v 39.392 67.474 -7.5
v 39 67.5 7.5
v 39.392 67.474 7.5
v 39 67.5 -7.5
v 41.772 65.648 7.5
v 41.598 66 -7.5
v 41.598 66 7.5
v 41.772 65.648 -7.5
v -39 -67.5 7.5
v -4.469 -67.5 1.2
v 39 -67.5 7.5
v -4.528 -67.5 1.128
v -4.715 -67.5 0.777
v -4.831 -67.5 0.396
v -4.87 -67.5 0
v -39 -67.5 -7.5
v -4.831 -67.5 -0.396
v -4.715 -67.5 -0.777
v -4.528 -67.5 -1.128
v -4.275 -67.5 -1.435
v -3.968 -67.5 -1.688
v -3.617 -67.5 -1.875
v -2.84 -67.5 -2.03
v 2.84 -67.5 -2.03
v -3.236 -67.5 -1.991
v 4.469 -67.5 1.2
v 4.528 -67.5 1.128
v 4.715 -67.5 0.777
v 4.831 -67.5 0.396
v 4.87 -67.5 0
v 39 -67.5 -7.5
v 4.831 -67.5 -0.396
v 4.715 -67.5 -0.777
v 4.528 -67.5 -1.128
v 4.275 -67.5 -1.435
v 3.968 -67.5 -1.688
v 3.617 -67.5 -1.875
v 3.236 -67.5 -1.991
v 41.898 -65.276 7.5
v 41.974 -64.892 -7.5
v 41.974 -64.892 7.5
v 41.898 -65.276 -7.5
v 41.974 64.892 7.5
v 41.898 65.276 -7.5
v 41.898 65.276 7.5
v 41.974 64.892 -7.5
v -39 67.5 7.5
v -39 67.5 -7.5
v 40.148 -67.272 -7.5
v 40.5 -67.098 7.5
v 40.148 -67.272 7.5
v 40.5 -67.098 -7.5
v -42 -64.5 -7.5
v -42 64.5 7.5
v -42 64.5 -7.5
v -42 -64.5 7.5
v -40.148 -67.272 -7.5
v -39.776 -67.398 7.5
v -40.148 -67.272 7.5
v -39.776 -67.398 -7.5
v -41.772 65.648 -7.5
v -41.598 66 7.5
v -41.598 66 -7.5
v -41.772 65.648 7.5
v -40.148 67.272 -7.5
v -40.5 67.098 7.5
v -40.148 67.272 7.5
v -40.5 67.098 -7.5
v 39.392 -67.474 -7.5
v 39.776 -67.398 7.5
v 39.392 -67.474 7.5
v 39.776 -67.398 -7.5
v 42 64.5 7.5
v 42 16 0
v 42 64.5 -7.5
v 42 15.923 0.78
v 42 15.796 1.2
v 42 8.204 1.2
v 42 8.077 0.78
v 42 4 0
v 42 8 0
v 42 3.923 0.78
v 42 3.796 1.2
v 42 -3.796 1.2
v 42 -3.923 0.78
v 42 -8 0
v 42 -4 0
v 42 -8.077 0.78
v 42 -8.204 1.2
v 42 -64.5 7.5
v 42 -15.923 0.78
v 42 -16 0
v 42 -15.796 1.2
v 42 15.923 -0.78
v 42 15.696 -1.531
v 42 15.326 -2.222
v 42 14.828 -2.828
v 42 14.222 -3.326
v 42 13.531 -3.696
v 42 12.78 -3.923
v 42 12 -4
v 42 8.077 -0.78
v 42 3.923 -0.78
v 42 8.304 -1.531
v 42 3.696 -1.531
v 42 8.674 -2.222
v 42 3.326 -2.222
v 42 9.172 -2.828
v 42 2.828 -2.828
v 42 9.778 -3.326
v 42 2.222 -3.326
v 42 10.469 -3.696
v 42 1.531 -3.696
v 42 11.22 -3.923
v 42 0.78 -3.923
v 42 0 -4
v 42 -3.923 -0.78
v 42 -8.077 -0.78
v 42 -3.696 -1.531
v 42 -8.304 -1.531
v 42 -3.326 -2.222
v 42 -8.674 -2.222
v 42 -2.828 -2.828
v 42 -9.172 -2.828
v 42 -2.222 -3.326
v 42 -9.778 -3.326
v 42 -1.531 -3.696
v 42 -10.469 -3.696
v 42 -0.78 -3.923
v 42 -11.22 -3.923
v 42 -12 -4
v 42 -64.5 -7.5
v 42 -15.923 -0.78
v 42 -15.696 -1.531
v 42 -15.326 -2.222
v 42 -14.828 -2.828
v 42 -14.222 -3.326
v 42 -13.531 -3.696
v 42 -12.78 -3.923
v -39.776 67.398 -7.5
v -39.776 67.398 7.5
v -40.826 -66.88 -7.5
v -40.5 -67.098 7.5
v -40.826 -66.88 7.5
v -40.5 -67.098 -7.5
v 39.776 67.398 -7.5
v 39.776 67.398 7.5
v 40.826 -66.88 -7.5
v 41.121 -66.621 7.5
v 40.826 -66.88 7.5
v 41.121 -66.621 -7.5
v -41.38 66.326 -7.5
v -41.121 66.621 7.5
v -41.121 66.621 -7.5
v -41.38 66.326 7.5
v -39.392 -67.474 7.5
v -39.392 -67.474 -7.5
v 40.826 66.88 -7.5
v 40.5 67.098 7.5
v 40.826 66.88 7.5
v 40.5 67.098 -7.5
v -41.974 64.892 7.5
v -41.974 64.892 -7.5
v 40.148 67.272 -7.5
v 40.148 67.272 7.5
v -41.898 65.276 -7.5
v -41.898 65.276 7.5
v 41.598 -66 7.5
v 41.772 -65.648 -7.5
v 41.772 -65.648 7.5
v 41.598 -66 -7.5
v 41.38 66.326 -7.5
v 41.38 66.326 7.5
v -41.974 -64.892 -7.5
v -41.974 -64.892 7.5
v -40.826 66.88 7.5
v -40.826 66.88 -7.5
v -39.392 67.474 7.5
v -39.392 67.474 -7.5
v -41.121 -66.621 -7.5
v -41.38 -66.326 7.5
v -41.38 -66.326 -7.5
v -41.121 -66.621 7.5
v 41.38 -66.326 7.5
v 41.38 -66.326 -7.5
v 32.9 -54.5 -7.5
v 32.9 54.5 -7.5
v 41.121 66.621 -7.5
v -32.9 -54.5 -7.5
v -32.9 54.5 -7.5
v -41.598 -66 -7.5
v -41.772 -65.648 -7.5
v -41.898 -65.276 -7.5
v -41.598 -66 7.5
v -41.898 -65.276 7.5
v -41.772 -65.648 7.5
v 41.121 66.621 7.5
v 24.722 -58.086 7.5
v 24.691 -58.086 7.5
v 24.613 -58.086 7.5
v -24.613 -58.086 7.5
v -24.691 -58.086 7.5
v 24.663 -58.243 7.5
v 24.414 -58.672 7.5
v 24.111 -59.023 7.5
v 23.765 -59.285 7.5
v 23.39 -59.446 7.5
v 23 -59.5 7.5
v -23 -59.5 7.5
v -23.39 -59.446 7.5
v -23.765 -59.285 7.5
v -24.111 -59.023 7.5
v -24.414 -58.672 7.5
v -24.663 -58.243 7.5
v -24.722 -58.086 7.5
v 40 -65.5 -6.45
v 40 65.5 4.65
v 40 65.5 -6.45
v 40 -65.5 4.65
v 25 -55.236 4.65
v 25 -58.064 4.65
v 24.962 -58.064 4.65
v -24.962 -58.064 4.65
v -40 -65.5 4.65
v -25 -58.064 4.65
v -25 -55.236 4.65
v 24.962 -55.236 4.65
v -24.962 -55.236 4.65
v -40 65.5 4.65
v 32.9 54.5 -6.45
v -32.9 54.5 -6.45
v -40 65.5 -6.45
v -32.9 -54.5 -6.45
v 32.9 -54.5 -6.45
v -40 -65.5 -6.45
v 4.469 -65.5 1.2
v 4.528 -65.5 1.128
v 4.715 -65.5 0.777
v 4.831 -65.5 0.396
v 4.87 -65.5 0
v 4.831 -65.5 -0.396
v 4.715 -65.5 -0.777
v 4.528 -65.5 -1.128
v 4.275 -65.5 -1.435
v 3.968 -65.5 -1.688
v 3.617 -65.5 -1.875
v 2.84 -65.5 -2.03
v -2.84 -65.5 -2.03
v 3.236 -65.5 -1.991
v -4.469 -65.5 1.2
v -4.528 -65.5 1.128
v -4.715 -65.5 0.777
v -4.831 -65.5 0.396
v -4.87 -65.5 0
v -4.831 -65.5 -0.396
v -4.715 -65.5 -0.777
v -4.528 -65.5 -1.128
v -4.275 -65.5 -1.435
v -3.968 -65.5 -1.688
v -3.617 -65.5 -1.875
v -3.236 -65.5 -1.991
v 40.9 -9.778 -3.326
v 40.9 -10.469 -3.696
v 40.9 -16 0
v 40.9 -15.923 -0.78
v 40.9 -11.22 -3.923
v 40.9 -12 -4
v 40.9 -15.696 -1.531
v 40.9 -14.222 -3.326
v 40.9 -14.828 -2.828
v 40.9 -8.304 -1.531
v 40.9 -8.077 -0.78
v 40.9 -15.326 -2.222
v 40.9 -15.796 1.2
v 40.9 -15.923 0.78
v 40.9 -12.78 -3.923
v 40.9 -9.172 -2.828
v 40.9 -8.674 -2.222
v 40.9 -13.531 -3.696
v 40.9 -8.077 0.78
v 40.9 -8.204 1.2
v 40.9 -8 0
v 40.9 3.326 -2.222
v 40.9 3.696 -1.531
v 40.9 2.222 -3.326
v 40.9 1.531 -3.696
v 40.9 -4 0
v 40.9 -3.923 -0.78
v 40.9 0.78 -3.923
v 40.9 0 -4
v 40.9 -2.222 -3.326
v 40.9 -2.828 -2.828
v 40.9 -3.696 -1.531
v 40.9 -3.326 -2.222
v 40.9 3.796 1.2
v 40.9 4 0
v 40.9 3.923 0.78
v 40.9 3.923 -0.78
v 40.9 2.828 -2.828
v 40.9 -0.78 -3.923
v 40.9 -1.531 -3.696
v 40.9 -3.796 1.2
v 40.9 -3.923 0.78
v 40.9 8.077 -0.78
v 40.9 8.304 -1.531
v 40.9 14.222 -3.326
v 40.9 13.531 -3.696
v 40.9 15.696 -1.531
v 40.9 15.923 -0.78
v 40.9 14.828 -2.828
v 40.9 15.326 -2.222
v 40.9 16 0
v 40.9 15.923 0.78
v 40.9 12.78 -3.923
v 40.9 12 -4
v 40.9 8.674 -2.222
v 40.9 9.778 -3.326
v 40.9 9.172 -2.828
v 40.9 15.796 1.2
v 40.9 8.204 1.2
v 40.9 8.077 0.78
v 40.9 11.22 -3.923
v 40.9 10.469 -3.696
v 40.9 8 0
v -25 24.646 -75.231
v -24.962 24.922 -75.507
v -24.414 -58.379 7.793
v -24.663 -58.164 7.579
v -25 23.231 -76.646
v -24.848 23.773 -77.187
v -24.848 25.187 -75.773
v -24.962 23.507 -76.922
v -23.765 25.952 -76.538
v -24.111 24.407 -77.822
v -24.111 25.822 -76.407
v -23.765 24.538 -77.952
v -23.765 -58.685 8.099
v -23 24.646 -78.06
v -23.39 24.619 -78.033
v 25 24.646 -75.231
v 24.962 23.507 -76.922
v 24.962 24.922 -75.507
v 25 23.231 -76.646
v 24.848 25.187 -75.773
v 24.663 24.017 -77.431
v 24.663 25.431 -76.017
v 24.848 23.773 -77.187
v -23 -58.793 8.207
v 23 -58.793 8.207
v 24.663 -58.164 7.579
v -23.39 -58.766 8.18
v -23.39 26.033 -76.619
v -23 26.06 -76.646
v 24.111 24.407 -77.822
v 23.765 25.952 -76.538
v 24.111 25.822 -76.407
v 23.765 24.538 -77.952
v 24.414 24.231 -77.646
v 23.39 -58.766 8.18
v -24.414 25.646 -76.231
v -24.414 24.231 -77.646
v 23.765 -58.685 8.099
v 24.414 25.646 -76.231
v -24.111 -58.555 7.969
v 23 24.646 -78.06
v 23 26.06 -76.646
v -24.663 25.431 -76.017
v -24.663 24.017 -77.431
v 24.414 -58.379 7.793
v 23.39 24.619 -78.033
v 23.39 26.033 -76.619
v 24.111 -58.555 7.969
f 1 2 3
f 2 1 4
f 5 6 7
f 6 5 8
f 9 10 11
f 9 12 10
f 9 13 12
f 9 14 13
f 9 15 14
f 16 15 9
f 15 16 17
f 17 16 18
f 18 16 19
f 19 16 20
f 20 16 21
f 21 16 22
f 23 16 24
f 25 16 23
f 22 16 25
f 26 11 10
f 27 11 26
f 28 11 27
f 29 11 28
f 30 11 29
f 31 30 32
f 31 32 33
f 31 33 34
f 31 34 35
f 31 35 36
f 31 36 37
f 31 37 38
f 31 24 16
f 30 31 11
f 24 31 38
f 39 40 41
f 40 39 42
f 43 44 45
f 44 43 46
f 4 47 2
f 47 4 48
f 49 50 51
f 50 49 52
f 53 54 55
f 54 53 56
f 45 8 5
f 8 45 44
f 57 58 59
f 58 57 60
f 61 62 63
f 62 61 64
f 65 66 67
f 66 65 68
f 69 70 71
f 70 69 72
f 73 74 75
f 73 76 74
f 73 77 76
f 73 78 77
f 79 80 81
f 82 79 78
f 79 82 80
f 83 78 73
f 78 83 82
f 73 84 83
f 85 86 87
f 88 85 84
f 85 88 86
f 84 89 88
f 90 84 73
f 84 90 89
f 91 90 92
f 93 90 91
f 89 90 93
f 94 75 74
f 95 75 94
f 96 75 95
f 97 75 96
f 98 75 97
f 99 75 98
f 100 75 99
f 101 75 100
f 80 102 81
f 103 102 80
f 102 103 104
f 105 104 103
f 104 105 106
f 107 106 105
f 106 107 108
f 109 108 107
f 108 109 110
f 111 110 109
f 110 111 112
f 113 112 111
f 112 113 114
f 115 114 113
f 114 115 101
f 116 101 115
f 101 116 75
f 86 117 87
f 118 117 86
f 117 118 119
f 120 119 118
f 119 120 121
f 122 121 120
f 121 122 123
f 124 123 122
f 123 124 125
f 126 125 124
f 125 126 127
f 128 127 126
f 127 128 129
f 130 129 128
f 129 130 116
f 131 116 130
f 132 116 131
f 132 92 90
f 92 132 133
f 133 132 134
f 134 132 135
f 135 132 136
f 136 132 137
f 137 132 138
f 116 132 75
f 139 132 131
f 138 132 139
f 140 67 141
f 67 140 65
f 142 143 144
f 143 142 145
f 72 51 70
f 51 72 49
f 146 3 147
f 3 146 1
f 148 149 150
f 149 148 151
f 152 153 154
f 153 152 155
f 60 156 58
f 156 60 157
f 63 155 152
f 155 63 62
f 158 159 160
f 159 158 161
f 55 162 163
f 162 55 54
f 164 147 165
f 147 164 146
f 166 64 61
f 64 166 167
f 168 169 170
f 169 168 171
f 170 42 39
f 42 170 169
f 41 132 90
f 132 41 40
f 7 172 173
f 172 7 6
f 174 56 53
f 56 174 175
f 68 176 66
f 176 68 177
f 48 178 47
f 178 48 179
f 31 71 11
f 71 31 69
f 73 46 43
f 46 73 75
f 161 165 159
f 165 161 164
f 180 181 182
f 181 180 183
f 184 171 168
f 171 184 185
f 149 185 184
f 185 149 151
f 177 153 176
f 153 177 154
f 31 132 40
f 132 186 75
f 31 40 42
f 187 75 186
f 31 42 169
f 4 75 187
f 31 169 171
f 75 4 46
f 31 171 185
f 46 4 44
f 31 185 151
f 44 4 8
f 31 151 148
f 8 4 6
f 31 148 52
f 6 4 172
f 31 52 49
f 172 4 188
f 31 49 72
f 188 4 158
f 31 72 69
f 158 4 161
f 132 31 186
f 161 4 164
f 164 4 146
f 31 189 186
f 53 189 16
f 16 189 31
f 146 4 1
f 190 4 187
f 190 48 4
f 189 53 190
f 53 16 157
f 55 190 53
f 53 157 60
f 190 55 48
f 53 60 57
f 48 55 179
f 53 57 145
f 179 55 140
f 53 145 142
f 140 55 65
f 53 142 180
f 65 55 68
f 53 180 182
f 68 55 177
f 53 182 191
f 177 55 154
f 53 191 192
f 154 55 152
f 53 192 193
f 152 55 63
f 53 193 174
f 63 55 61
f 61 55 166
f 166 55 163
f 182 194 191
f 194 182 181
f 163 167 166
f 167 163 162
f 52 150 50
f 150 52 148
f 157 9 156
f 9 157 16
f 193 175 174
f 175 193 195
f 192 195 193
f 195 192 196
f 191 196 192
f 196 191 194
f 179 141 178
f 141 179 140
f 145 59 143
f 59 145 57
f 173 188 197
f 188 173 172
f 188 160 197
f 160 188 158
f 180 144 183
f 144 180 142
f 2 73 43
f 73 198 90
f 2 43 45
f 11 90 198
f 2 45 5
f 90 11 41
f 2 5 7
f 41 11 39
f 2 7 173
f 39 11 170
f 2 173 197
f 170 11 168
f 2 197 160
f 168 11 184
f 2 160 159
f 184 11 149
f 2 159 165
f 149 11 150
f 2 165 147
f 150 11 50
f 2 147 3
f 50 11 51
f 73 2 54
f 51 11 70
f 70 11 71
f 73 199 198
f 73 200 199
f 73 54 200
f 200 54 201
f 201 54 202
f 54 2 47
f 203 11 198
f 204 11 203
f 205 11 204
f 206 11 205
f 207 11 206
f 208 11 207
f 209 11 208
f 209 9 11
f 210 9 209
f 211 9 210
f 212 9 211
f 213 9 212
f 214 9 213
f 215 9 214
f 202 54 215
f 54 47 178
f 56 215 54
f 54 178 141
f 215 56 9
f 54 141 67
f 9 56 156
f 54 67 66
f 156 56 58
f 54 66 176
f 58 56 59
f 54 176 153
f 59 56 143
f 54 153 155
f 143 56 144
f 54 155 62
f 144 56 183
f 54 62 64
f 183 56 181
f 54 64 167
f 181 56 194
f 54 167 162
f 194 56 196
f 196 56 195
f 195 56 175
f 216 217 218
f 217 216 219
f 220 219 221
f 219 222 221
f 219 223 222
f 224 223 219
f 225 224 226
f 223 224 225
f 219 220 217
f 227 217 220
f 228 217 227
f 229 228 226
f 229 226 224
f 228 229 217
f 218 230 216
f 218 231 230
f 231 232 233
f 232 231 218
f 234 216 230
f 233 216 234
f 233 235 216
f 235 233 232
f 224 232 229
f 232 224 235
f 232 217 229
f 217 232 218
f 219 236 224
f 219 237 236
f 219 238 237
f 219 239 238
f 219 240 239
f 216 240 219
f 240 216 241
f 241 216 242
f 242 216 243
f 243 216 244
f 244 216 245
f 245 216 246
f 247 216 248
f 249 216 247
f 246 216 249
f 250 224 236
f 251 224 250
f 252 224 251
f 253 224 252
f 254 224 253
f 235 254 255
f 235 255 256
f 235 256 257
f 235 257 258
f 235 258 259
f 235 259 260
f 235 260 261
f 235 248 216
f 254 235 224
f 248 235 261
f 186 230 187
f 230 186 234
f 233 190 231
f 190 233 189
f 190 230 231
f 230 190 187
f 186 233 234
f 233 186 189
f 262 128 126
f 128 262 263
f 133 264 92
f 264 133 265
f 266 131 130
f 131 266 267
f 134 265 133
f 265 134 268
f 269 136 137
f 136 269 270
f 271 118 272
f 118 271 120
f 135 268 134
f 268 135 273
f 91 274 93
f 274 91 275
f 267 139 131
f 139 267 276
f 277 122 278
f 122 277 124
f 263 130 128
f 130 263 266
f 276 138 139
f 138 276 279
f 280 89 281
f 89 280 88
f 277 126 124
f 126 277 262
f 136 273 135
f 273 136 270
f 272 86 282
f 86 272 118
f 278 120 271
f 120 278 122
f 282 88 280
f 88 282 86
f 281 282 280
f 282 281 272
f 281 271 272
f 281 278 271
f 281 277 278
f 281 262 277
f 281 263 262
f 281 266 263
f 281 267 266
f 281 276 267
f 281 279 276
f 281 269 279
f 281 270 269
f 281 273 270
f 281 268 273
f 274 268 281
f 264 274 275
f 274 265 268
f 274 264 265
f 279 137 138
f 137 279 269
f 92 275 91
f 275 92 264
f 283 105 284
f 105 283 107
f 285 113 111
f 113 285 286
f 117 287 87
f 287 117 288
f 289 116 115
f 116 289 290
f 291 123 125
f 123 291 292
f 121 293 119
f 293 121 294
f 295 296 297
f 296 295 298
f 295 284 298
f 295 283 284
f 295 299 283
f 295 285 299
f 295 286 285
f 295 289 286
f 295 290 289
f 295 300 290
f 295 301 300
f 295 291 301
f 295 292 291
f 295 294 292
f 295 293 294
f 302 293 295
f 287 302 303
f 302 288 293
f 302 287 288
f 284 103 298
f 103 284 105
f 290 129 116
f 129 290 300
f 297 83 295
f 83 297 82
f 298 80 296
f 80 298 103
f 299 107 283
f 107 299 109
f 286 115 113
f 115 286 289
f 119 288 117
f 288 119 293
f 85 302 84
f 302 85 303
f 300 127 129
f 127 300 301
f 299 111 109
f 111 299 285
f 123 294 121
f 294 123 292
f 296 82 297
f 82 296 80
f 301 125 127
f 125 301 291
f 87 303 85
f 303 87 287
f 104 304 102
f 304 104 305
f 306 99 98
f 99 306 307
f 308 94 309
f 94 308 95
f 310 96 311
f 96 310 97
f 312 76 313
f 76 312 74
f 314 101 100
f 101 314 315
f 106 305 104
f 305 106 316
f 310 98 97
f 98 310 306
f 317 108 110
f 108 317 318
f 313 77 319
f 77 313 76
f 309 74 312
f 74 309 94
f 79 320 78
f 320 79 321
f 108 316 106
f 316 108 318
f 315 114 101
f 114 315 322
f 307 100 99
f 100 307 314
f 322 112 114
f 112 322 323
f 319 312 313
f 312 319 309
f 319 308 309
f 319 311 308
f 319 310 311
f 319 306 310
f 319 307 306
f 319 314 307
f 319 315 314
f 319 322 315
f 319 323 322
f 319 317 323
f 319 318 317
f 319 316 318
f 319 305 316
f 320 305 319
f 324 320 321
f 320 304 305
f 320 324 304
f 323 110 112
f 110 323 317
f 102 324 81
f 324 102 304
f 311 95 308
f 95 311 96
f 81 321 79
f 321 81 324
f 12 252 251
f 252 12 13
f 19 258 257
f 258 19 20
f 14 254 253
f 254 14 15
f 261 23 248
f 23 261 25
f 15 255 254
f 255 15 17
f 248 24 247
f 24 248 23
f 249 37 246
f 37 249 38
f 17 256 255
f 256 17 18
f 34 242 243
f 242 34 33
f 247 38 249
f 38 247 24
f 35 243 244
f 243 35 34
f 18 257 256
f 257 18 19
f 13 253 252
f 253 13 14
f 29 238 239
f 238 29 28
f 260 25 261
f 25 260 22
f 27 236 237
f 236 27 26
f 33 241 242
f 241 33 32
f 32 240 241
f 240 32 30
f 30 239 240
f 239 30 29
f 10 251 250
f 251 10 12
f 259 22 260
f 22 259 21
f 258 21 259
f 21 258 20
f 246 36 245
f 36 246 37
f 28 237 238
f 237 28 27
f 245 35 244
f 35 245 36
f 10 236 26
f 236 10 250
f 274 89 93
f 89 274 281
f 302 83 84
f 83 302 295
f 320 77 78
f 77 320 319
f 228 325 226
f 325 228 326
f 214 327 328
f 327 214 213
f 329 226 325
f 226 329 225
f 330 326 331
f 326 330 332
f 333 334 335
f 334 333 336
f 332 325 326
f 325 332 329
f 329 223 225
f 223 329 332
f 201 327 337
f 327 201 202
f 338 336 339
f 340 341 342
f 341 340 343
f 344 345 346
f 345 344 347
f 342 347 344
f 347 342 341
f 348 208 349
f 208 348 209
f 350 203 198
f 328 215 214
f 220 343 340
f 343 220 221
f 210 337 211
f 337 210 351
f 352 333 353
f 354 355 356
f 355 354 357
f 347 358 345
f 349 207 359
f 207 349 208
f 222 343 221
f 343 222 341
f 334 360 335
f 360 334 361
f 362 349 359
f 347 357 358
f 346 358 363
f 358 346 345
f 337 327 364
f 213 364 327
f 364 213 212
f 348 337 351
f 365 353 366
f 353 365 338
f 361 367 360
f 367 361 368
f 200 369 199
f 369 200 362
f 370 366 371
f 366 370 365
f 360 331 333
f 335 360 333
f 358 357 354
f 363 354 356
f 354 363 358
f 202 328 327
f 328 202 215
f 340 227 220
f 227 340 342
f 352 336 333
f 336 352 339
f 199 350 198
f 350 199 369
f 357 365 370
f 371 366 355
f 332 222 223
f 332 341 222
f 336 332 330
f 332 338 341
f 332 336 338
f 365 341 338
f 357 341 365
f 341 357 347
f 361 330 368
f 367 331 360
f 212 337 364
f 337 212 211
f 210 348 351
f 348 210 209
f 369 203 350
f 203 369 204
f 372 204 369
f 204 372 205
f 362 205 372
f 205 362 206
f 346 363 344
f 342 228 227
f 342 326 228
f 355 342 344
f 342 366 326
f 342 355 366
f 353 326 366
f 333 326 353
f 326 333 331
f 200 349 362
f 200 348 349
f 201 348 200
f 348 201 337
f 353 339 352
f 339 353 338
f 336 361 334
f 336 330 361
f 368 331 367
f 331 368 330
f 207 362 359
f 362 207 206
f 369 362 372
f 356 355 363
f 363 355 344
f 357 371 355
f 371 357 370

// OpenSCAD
union() {
	color(alpha = 0.9, c = "LightGray") {
		difference() {
			difference() {
				difference() {
					difference() {
						difference() {
							hull() {
								translate(v = [-39.0, -64.5, 0]) {
									cylinder($fn = 48, center = true, h = 15.0, r = 3.0);
								}
								translate(v = [-39.0, 64.5, 0]) {
									cylinder($fn = 48, center = true, h = 15.0, r = 3.0);
								}
								translate(v = [39.0, -64.5, 0]) {
									cylinder($fn = 48, center = true, h = 15.0, r = 3.0);
								}
								translate(v = [39.0, 64.5, 0]) {
									cylinder($fn = 48, center = true, h = 15.0, r = 3.0);
								}
							}
							translate(v = [0, 0, -0.9]) {
								cube(center = true, size = [80.0, 131.0, 11.1]);
							}
						}
						translate(v = [0, 0, -3.0]) {
							cube(center = true, size = [75.4, 120.4, 5.1]);
						}
					}
					translate(v = [0, 0, -6.5]) {
						cube(center = true, size = [65.8, 109.0, 2.2]);
					}
				}
				union() {
					translate(v = [42.0, -12.0, 0]) {
						rotate(a = [0, 90, 0]) {
							cylinder($fn = 32, center = true, d = 8.0, h = 2.2);
						}
					}
					translate(v = [42.0, 0.0, 0]) {
						rotate(a = [0, 90, 0]) {
							cylinder($fn = 32, center = true, d = 8.0, h = 2.2);
						}
					}
					translate(v = [42.0, 12.0, 0]) {
						rotate(a = [0, 90, 0]) {
							cylinder($fn = 32, center = true, d = 8.0, h = 2.2);
						}
					}
				}
			}
			translate(v = [0, -67.5, 0]) {
				rotate(a = [90, 0, 0]) {
					linear_extrude(center = true, height = 15.2) {
						hull() {
							translate(v = [-2.84, 0]) {
								circle($fn = 32, r = 2.0300000000000002);
							}
							translate(v = [2.84, 0]) {
								circle($fn = 32, r = 2.0300000000000002);
							}
						}
					}
				}
			}
		}
	}
	color(alpha = 0.85, c = "DarkGray") {
		difference() {
			difference() {
				translate(v = [0, 0, 4.35]) {
					hull() {
						translate(v = [-39.0, -64.5, 0]) {
							cylinder($fn = 48, center = true, h = 6.3, r = 3.0);
						}
						translate(v = [-39.0, 64.5, 0]) {
							cylinder($fn = 48, center = true, h = 6.3, r = 3.0);
						}
						translate(v = [39.0, -64.5, 0]) {
							cylinder($fn = 48, center = true, h = 6.3, r = 3.0);
						}
						translate(v = [39.0, 64.5, 0]) {
							cylinder($fn = 48, center = true, h = 6.3, r = 3.0);
						}
					}
				}
				translate(v = [0, 0, 3.3500000000000005]) {
					cube(center = true, size = [80.0, 131.0, 4.3999999999999995]);
				}
			}
			translate(v = [0, 0.7999999999999972, 6.35]) {
				cube(center = true, size = [50.6, 120.6, 2.4]);
			}
		}
	}
	color(alpha = 0.75, c = "Gray") {
		translate(v = [0, -59.5, 7.5]) {
			rotate(a = [-45, 0, 0]) {
				translate(v = [0, 60.0, 0]) {
					hull() {
						translate(v = [-23.0, -58.0, 0]) {
							cylinder($fn = 32, center = true, h = 2.0, r = 2.0);
						}
						translate(v = [-23.0, 58.0, 0]) {
							cylinder($fn = 32, center = true, h = 2.0, r = 2.0);
						}
						translate(v = [23.0, -58.0, 0]) {
							cylinder($fn = 32, center = true, h = 2.0, r = 2.0);
						}
						translate(v = [23.0, 58.0, 0]) {
							cylinder($fn = 32, center = true, h = 2.0, r = 2.0);
						}
					}
				}
			}
		}
	}
}
